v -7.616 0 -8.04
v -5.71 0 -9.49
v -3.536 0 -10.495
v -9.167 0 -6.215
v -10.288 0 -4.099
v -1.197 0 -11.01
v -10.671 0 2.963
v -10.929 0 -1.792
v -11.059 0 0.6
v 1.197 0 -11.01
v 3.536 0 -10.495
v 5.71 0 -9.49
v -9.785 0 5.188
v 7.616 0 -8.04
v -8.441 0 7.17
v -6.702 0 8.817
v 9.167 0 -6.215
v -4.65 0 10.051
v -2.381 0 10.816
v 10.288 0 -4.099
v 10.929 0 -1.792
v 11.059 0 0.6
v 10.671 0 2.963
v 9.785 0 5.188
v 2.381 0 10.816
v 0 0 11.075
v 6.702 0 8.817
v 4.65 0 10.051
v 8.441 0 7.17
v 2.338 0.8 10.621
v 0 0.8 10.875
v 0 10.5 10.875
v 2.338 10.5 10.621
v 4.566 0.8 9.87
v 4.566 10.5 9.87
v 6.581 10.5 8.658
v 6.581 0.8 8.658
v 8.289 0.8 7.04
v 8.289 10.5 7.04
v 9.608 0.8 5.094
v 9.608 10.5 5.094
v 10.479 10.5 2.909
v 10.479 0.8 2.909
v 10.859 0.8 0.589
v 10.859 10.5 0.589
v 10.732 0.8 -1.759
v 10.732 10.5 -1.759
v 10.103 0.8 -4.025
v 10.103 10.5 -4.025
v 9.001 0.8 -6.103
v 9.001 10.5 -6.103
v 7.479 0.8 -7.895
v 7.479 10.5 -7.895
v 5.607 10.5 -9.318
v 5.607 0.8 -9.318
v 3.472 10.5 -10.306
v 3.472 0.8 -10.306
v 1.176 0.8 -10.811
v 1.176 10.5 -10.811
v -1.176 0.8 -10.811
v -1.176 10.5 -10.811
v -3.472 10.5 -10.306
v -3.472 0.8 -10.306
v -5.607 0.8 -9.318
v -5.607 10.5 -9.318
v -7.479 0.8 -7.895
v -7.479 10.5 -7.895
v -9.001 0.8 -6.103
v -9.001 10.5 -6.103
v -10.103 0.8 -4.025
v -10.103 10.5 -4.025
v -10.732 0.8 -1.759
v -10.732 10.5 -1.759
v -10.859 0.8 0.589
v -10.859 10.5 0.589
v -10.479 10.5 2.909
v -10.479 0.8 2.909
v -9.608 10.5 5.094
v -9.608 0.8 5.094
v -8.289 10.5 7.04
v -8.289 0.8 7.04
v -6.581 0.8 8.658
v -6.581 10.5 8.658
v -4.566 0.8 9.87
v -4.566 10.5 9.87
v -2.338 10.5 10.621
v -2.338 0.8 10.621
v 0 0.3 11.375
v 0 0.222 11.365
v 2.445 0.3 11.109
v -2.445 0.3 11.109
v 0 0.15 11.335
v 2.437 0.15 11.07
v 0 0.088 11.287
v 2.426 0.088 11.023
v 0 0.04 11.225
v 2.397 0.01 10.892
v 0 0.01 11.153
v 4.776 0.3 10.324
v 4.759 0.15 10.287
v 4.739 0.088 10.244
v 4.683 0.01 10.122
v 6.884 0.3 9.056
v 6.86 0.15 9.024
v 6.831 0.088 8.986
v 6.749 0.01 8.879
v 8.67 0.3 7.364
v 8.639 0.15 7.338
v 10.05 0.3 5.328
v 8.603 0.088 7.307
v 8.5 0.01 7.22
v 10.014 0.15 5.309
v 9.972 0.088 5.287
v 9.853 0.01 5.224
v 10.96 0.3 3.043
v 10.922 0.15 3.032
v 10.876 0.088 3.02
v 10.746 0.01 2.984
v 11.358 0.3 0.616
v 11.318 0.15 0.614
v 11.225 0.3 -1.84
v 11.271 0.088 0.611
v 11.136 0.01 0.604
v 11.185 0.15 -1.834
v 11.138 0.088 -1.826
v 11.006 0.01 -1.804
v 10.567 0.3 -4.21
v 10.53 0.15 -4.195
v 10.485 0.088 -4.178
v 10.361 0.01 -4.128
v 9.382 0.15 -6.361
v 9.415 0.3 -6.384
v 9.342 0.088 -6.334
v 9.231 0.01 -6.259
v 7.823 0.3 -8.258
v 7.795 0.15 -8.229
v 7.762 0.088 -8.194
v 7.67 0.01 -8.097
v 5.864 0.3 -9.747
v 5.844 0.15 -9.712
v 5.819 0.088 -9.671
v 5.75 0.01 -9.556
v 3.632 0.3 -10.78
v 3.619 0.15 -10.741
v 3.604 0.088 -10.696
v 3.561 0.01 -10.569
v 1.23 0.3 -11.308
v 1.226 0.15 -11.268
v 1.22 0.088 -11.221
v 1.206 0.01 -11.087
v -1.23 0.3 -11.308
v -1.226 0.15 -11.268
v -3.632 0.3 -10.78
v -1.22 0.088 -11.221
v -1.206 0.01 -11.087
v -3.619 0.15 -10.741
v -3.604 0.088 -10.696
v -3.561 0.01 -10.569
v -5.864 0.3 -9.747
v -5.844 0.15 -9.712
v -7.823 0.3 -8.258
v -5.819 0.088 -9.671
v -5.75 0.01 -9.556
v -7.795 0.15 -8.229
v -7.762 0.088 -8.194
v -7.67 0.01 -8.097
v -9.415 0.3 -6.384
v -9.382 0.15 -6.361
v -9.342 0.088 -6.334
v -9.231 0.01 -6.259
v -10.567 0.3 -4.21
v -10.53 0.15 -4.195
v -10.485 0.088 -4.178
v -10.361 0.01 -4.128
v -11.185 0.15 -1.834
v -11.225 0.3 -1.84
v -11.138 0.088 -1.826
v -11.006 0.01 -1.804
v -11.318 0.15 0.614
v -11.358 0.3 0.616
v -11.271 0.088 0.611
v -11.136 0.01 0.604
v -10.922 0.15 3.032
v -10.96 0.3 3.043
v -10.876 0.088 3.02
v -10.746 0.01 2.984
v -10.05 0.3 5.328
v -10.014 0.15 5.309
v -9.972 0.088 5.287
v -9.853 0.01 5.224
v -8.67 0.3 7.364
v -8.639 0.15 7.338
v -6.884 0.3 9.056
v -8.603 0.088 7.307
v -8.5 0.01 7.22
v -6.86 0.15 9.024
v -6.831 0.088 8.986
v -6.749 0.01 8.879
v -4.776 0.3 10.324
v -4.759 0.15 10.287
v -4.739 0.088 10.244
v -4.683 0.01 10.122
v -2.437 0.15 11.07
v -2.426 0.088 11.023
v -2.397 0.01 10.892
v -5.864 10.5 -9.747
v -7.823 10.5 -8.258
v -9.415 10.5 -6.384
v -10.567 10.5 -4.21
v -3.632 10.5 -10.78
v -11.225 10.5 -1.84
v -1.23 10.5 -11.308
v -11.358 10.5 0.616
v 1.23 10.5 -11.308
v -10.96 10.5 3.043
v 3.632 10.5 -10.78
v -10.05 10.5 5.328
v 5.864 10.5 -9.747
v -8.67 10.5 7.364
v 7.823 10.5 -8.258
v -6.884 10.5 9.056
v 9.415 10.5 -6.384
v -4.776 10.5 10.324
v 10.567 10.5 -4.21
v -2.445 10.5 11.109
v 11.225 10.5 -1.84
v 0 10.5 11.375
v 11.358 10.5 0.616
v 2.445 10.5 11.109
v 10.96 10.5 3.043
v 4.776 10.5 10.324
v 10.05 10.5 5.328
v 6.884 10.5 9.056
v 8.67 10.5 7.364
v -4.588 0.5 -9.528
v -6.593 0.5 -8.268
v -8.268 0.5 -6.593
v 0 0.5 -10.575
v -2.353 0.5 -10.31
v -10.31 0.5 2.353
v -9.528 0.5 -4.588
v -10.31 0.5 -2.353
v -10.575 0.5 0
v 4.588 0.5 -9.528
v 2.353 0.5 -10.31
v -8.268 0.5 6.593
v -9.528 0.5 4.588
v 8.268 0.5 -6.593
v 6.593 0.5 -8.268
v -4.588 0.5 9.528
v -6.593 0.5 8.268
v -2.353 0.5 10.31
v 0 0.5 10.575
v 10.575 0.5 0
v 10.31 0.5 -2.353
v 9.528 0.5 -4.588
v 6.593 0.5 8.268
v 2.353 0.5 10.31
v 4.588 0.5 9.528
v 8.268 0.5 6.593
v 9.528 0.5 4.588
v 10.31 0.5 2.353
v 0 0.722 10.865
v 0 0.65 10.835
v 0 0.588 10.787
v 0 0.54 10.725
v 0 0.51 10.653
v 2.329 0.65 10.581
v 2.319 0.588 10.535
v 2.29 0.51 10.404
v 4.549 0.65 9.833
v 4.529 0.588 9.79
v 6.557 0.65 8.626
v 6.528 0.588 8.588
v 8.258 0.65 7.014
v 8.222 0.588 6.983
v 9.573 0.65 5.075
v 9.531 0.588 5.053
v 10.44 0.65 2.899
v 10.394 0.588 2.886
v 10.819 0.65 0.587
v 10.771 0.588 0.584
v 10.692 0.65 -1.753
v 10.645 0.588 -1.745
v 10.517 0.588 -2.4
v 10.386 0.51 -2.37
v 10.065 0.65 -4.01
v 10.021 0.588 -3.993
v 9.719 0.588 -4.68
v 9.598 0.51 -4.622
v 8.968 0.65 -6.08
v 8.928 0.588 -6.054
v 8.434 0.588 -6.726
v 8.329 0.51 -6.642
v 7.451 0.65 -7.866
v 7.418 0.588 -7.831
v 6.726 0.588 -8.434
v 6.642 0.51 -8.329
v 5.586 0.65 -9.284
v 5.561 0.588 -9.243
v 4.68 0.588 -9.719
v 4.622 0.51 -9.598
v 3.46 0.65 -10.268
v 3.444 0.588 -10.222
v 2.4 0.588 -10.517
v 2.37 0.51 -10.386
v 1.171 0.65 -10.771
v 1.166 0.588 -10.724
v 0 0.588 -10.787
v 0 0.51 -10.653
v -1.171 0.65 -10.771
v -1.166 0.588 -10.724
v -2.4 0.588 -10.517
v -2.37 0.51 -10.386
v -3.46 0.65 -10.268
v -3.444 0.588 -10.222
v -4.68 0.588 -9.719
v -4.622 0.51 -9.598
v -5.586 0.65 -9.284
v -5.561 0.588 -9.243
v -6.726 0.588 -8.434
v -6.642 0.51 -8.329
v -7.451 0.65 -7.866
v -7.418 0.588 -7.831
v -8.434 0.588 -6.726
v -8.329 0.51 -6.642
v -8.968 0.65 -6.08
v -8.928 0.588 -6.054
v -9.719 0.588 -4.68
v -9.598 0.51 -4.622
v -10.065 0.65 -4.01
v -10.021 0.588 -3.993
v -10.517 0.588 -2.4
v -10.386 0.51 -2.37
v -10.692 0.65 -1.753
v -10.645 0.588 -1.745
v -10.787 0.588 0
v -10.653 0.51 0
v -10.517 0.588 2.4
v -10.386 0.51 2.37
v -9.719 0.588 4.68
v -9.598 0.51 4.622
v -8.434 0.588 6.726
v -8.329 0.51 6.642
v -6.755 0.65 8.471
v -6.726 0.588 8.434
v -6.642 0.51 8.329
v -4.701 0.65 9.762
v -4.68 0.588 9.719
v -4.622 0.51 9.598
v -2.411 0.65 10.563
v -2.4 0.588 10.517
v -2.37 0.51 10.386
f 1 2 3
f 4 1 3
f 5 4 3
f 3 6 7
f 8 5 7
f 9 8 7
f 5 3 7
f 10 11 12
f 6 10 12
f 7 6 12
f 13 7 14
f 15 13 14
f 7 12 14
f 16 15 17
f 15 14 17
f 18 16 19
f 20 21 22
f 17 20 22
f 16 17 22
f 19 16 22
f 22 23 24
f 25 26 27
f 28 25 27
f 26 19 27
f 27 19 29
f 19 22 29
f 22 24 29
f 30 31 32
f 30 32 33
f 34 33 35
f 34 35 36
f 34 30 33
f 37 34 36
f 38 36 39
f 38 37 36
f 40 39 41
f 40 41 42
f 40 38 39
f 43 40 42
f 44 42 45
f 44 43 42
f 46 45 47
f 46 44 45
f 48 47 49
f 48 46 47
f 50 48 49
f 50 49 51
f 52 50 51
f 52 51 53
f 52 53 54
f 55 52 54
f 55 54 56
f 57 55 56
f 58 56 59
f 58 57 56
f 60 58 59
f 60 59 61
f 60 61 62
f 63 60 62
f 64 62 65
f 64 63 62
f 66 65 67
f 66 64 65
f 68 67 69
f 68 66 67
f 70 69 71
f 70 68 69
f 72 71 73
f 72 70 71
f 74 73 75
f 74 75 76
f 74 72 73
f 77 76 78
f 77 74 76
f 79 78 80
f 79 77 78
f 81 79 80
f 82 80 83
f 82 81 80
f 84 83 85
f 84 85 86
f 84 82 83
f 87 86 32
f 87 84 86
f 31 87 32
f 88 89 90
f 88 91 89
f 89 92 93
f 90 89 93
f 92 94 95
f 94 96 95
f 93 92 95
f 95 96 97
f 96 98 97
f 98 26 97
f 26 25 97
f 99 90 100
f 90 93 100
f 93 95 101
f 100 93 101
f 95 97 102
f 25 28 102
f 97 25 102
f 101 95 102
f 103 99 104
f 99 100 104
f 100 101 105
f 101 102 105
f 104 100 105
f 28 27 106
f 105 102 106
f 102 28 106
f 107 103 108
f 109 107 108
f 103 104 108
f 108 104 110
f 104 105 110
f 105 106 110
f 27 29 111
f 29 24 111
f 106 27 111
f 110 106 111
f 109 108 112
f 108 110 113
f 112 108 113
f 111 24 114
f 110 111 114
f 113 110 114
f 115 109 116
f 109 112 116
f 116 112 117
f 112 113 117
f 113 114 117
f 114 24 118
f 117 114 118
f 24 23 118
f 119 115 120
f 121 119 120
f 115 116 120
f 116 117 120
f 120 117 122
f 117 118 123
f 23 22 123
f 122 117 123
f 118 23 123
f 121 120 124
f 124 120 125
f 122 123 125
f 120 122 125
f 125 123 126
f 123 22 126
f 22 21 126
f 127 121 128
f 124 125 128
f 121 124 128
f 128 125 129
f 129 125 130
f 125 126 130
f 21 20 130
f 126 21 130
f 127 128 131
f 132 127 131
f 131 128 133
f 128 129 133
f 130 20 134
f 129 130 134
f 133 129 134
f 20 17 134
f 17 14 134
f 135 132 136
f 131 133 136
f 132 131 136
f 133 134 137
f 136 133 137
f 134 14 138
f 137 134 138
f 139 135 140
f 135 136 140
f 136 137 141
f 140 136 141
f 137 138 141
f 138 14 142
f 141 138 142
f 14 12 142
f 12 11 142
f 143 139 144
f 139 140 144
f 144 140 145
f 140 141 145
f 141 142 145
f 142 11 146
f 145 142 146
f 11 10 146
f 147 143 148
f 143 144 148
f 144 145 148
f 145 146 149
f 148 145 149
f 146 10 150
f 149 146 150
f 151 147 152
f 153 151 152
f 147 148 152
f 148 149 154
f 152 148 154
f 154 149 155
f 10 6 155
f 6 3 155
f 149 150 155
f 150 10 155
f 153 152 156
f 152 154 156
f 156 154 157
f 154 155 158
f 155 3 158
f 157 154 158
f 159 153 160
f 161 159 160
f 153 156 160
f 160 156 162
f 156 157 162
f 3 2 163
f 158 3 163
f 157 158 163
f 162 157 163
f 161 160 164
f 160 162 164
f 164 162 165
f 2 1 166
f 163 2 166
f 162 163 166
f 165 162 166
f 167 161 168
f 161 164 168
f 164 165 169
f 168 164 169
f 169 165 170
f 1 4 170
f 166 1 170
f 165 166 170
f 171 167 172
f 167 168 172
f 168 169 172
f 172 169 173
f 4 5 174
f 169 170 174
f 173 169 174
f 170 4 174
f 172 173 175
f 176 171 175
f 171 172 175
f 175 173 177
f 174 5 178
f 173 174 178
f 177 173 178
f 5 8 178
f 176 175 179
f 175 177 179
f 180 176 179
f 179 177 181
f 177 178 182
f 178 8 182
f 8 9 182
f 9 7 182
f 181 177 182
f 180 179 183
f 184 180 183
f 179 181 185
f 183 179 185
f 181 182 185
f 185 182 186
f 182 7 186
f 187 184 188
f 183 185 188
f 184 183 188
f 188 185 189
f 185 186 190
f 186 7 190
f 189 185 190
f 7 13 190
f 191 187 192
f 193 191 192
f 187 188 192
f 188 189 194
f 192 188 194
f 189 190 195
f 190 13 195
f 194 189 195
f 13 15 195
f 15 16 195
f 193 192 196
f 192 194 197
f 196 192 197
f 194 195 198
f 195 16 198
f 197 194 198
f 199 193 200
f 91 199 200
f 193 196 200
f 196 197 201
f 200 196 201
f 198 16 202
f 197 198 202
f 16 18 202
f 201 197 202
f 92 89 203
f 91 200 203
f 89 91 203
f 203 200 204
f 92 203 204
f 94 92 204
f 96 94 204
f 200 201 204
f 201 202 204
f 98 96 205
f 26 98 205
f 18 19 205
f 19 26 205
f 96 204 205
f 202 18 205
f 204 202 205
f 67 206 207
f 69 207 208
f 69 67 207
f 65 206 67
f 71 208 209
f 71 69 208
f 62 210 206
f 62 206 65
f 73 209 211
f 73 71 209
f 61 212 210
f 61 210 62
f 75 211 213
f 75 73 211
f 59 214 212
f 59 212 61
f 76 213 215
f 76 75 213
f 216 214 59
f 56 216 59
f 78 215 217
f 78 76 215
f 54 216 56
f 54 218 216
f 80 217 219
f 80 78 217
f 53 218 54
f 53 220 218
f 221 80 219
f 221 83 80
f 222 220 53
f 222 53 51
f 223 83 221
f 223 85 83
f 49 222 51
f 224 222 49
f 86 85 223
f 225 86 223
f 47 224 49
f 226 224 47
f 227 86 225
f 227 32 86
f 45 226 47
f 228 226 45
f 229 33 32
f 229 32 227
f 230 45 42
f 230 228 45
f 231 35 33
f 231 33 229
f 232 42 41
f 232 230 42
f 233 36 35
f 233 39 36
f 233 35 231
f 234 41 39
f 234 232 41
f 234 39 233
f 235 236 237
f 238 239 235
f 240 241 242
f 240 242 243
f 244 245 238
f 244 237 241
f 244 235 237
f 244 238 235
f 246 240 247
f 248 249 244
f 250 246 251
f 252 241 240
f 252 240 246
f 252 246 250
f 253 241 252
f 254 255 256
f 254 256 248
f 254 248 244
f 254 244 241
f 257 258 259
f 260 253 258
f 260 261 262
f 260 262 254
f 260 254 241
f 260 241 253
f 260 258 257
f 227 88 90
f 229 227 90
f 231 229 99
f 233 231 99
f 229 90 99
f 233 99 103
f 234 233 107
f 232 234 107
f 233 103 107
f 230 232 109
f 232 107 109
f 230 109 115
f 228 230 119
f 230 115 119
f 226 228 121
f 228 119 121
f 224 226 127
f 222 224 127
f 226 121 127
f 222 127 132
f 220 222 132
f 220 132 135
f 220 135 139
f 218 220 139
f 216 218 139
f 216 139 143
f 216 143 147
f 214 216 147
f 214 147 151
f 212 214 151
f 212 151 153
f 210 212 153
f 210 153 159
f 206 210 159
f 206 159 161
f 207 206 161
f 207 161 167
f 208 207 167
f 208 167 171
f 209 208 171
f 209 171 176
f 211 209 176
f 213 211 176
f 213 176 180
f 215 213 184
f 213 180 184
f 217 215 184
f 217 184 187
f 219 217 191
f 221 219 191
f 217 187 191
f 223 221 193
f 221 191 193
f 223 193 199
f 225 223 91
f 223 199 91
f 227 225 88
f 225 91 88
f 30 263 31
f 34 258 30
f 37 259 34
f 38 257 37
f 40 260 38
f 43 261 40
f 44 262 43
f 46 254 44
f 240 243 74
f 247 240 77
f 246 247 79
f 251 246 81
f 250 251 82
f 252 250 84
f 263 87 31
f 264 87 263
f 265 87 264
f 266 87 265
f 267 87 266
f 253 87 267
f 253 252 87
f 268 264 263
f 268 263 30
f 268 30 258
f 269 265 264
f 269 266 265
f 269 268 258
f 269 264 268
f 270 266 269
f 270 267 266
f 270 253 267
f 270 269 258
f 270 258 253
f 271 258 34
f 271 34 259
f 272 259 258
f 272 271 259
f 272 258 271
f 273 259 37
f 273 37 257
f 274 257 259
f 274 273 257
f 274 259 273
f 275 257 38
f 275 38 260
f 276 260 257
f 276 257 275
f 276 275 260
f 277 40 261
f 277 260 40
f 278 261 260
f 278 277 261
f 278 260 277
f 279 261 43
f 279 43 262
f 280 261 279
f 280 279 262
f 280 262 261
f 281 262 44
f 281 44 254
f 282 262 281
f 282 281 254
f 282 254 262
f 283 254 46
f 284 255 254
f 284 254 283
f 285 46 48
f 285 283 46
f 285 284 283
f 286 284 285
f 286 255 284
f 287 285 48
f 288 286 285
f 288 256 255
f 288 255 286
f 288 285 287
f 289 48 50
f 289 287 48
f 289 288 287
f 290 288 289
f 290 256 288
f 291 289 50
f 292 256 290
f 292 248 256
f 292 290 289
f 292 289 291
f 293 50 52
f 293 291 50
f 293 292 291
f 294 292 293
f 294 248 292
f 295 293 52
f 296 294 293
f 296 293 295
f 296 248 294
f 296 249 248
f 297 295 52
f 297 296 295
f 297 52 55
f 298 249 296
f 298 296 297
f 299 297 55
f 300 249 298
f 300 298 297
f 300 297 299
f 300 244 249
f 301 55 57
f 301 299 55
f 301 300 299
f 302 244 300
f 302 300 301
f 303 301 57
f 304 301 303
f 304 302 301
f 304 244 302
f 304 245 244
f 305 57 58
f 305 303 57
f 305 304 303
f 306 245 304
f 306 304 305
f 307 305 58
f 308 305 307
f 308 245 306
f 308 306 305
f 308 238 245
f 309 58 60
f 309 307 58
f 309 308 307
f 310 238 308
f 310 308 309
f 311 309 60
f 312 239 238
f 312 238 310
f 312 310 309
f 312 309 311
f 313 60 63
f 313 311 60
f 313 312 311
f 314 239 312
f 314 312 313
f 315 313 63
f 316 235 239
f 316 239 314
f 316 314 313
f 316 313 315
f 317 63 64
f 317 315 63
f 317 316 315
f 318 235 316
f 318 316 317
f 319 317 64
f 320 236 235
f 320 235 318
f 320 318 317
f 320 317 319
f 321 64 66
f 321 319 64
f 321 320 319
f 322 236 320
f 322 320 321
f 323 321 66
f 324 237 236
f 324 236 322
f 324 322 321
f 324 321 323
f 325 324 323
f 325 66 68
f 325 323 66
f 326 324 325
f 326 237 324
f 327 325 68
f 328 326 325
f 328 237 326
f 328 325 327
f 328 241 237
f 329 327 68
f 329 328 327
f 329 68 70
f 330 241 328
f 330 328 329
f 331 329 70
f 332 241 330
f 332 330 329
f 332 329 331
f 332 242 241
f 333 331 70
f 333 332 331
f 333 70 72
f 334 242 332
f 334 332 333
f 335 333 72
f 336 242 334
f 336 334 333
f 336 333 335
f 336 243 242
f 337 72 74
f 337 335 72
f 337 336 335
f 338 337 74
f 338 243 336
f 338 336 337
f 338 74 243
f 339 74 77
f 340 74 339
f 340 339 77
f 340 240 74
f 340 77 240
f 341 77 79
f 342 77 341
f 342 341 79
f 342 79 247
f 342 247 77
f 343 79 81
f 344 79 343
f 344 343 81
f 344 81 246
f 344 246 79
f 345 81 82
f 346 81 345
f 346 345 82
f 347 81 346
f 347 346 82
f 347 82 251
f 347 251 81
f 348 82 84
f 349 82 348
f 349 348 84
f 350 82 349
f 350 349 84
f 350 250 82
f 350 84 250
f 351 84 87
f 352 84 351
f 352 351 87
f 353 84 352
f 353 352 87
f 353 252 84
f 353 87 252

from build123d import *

# Parameters (mm, degrees)
CROQUIS1_R              = 11.375
SALIENTE_EXTRUIR1_DEPTH = 0.5
CROQUIS2_R              = 11.375
CROQUIS2_R_2            = 10.875
SALIENTE_EXTRUIR2_DEPTH = 10
REDONDEO1_R             = 0.3
REDONDEO2_R             = 0.3


with BuildPart() as part:
    # Croquis1 → Saliente-Extruir1 (new body)
    with BuildSketch(Plane(origin=(0, 0, 0), x_dir=(1, 0, 0), z_dir=(0, 1, 0))):
        with Locations(Location((0, 0, 0), (0, 0, 270))):
            Circle(CROQUIS1_R)
    extrude(amount=SALIENTE_EXTRUIR1_DEPTH)

    # Croquis2 → Saliente-Extruir2 (add)
    with BuildSketch(Plane(origin=(0, 0.5, 0), x_dir=(1, 0, 0), z_dir=(0, 1, 0))):
        with Locations(Location((0, 0, 0), (0, 0, 270))):
            Circle(CROQUIS2_R)
        with Locations(Location((0, 0, 0), (0, 0, 270))):
            Circle(CROQUIS2_R_2, mode=Mode.SUBTRACT)
    extrude(amount=SALIENTE_EXTRUIR2_DEPTH)

    # Redondeo1
    redondeo1_edges = [part.edges().sort_by_distance(p)[0] for p in [
        (0, 0.5, -10.875),
    ]]
    fillet(redondeo1_edges, radius=REDONDEO1_R)

    # Redondeo2
    redondeo2_edges = [part.edges().sort_by_distance(p)[0] for p in [
        (0, 0, -11.375),
    ]]
    fillet(redondeo2_edges, radius=REDONDEO2_R)


solid = part.part
